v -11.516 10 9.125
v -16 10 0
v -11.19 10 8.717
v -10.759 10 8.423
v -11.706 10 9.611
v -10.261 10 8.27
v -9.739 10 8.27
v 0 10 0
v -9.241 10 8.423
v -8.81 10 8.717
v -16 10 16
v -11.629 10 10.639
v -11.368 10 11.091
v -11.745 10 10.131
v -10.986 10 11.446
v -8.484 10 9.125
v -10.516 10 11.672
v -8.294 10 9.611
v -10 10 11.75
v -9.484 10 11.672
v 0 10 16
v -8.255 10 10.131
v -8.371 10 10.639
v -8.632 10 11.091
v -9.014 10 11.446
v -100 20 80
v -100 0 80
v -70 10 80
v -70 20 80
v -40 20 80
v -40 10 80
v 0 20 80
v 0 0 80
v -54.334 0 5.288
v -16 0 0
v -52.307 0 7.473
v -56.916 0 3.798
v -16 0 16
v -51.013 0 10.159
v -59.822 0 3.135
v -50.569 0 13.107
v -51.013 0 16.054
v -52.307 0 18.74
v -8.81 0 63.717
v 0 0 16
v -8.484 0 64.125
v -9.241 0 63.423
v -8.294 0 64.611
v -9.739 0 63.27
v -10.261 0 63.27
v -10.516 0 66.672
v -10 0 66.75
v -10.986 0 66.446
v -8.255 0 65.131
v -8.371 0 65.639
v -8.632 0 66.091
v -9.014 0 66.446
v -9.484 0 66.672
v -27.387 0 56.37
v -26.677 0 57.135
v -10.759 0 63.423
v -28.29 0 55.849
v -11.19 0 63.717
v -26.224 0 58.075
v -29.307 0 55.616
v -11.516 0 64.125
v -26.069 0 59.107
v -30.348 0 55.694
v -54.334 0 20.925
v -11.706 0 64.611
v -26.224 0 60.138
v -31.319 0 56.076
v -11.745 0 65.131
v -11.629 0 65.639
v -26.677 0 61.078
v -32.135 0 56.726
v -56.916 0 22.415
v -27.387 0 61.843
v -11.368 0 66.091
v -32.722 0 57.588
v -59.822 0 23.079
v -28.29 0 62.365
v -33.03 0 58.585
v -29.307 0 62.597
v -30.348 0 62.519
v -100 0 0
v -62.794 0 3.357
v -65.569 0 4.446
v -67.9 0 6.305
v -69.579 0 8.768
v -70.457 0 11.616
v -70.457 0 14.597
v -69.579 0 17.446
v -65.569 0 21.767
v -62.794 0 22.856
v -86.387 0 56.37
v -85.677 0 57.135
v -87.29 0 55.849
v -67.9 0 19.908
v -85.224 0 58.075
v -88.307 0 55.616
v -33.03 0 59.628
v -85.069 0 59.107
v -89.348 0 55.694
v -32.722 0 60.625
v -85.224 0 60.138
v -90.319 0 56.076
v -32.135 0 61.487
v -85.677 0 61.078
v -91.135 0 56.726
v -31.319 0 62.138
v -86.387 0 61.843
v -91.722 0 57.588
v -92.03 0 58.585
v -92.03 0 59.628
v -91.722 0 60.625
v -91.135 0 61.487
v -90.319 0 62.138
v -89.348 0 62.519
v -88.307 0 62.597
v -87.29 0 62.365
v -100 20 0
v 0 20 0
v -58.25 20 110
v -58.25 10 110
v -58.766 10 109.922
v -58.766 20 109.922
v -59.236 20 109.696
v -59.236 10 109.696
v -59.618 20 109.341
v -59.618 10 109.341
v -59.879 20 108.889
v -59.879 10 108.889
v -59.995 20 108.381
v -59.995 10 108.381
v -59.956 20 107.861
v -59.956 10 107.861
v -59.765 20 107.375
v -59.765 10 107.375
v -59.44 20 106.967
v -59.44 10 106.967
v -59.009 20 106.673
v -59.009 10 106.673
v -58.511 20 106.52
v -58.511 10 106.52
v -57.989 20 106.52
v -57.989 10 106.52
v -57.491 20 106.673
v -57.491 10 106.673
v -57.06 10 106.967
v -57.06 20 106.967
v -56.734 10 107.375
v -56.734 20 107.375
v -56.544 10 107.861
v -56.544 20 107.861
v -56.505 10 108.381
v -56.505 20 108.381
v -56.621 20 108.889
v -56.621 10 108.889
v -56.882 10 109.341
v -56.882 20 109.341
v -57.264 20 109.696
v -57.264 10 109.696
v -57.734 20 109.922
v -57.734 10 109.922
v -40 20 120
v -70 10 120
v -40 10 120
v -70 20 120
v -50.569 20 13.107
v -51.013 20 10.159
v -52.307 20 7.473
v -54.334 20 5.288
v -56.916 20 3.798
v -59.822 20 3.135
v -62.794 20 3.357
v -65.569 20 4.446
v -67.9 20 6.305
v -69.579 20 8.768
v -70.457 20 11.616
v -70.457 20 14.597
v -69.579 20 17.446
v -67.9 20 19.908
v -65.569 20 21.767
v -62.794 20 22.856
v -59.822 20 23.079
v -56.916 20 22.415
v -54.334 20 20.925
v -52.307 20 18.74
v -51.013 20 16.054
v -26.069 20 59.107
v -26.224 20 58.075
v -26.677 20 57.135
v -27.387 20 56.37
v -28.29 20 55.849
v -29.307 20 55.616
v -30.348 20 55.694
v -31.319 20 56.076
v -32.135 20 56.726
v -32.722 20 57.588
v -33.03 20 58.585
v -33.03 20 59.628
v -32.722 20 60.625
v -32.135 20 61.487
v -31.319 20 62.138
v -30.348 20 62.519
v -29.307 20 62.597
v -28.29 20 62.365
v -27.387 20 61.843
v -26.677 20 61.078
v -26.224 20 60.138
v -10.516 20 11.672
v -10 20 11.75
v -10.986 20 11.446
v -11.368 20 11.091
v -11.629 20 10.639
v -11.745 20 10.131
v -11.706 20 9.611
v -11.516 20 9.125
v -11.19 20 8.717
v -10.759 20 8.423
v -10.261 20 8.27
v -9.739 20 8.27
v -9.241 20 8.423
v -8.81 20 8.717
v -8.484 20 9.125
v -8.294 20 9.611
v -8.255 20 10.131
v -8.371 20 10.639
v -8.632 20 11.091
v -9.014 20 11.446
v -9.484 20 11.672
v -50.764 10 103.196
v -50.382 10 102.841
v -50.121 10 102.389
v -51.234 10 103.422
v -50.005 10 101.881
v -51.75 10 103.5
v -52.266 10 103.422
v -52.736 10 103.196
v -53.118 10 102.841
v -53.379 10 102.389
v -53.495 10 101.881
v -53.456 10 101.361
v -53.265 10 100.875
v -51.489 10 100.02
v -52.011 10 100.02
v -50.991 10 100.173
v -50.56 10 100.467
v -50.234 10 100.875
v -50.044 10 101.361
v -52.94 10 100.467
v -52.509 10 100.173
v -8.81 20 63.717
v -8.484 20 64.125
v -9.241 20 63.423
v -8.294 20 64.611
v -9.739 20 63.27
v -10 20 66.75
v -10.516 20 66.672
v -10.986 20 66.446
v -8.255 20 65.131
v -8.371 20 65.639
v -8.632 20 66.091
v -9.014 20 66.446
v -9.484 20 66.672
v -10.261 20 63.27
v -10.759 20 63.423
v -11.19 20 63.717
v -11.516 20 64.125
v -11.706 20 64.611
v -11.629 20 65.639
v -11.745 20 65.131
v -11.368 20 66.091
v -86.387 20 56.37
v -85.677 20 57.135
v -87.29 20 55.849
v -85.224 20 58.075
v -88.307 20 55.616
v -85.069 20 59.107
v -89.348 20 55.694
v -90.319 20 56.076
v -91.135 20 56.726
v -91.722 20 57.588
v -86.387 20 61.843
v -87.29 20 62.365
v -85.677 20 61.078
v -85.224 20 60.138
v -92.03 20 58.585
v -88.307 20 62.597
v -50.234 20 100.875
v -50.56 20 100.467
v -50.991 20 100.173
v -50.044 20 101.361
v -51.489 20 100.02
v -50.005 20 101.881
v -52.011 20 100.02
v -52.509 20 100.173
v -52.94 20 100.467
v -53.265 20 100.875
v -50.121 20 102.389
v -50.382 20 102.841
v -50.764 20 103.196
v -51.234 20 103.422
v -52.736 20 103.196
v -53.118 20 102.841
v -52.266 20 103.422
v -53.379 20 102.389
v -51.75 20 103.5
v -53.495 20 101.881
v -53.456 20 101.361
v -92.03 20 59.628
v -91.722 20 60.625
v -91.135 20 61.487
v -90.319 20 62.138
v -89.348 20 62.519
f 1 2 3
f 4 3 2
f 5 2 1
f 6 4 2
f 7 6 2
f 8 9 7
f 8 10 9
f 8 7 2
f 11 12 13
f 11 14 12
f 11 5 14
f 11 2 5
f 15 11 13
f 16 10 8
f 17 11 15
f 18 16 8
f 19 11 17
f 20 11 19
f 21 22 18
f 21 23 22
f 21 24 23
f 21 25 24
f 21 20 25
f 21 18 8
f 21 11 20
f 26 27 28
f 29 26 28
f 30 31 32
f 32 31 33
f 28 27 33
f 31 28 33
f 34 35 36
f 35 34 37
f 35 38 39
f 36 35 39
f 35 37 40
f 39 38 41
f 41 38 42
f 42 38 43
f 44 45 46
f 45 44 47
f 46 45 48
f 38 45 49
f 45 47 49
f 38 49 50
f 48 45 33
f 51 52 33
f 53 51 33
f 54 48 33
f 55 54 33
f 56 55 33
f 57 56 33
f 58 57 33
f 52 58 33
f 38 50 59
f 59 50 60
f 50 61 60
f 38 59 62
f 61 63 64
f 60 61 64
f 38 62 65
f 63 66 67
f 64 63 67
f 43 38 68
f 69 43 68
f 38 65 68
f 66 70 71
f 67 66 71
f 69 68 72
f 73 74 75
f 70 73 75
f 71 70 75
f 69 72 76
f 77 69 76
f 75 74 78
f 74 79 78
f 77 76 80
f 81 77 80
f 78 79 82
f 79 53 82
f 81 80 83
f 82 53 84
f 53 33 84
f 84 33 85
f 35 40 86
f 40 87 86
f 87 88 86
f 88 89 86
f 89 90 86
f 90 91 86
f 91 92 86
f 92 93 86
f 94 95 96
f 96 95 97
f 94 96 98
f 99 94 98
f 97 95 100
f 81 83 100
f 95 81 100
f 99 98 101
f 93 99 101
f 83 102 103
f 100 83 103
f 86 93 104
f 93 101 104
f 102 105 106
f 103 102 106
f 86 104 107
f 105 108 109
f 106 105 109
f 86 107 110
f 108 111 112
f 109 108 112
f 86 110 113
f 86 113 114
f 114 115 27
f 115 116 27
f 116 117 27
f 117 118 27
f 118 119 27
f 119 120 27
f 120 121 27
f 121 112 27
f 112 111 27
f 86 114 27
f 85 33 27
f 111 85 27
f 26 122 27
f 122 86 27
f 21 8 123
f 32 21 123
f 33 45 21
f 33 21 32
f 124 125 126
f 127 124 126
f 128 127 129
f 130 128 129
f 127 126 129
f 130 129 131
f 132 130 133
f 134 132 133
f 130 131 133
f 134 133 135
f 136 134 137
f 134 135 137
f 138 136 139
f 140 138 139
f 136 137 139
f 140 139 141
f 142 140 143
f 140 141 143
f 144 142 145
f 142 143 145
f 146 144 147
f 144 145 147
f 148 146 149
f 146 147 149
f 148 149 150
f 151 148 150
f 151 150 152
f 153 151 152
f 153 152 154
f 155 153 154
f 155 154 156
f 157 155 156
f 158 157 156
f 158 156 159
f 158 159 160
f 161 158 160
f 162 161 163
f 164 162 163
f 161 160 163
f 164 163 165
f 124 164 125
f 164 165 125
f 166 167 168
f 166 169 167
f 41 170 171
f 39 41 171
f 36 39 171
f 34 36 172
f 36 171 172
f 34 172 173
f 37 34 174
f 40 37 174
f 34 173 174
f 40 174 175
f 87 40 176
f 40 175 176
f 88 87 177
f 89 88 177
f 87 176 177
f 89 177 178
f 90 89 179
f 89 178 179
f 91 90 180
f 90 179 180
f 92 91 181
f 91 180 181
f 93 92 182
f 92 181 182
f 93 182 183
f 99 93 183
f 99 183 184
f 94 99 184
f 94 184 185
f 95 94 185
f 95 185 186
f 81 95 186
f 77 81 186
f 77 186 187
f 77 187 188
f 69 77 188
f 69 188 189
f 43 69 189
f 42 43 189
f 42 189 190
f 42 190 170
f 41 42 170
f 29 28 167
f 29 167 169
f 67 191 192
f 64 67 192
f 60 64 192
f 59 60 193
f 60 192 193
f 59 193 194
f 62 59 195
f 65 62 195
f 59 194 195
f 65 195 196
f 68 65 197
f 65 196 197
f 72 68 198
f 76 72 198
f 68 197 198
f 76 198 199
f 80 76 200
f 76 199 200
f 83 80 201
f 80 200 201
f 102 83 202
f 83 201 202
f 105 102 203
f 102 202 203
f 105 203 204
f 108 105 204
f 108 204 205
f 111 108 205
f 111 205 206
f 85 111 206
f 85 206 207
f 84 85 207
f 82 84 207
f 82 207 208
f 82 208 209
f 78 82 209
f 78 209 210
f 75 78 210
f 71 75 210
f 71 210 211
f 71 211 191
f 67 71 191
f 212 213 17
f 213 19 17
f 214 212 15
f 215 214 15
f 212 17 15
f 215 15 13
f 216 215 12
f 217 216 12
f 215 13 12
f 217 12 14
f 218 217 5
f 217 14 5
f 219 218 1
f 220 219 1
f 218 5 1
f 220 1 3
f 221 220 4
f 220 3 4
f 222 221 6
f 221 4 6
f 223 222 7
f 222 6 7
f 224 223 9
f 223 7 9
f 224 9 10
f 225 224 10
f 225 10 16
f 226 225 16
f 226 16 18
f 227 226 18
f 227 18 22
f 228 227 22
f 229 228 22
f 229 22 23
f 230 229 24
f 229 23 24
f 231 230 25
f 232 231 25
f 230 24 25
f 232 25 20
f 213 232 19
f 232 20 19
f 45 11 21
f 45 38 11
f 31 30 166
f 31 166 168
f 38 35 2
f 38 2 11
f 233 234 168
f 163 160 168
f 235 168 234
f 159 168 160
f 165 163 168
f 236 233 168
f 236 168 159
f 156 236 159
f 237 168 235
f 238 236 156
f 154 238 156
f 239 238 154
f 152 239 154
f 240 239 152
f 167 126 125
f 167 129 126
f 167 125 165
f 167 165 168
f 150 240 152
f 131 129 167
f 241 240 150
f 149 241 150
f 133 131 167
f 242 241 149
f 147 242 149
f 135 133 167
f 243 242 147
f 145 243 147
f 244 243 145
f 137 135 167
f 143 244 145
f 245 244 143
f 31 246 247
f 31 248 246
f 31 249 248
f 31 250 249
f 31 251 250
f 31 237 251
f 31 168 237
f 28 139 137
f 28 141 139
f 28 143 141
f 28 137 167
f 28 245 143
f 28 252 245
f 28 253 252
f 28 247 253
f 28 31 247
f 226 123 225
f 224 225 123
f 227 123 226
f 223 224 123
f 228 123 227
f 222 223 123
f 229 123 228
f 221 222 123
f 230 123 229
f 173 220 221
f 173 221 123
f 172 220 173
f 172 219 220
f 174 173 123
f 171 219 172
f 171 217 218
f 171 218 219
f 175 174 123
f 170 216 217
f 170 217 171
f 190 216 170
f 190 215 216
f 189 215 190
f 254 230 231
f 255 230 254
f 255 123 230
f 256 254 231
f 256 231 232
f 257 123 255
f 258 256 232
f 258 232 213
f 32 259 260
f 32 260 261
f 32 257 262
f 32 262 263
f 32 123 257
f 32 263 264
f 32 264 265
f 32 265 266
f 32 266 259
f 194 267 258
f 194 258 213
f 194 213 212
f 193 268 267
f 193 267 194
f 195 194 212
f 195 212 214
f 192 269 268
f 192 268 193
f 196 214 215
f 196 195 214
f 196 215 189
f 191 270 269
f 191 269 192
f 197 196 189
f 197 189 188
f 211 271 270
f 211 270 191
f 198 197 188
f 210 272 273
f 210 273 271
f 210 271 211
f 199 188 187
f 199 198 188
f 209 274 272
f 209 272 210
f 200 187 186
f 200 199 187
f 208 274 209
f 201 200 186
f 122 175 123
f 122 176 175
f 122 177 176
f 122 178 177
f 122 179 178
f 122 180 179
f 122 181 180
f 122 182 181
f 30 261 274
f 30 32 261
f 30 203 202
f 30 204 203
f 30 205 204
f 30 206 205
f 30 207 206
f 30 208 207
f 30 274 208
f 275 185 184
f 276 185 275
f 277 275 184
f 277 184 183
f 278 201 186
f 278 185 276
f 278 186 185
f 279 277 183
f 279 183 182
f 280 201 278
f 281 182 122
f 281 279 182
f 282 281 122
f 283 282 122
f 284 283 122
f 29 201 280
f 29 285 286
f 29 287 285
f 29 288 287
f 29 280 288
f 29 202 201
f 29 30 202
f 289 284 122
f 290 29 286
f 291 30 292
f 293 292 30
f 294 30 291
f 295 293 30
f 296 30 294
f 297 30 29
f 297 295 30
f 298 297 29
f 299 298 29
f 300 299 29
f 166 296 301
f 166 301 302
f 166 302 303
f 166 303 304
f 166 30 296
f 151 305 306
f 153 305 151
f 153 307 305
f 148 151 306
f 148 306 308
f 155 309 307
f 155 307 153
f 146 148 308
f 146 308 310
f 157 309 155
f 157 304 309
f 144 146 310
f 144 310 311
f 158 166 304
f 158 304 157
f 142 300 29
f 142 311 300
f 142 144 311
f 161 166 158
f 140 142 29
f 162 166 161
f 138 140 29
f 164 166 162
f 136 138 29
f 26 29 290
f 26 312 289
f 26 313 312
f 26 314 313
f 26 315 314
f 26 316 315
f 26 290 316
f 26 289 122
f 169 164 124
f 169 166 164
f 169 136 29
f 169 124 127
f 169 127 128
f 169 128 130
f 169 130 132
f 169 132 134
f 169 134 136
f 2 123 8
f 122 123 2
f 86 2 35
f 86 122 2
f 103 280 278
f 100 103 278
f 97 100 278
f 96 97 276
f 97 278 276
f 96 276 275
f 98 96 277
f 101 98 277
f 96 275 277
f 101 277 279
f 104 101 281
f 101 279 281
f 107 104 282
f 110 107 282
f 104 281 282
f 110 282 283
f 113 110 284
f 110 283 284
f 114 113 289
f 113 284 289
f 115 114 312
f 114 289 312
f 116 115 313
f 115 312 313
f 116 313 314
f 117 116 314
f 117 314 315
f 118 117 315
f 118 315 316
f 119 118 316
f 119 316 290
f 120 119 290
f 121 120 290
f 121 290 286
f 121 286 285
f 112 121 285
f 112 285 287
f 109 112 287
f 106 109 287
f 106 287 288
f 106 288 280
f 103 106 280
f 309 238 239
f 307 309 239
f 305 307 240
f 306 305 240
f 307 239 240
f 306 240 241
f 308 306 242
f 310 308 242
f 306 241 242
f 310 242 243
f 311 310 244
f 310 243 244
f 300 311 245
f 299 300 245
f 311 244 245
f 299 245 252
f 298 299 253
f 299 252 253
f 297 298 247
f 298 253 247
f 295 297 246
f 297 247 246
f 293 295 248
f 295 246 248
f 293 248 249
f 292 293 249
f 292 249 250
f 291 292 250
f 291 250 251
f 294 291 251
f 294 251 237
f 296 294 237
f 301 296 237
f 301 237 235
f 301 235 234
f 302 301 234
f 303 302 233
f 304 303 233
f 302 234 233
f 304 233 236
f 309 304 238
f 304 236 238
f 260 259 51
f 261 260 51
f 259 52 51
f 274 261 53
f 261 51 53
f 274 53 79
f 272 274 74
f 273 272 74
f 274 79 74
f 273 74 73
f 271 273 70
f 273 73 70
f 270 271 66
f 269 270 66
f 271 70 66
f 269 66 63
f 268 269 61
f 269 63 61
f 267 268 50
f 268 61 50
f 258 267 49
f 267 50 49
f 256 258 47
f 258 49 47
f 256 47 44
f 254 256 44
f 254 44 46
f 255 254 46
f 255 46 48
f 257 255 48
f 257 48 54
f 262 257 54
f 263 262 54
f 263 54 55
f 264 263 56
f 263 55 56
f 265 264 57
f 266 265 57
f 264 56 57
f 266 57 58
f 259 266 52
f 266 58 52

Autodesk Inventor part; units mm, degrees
ref_plane "YZ Plane" through (0, 0, 0) normal (1, 0, 0) x (0, 1, 0)
ref_plane "XZ Plane" through (0, 0, 0) normal (0, 1, 0) x (-1, 0, 0)
ref_plane "XY Plane" through (0, 0, 0) normal (0, 0, 1) x (1, 0, 0)
sketch "Boceto1" plane through (0, 0, 0) normal (0, 1, 0) x (-1, 0, 0)
  line L0 (100, 80) -> (-100, 80)
  line L1 (-100, 80) -> (-100, -80)
  line L2 (-100, -80) -> (100, -80)
  line L3 (100, -80) -> (100, 80)
  line L4 (100, 80) -> (-100, -80) construction
  line L5 (-100, 80) -> (100, -80) construction
  point P0 (0, 0)
  dimension "d0" = 200
  dimension "d1" = 160
extrude "Extrusión1" add sketch "Boceto1" along normal blind 20
sketch "Boceto2" plane through (0, 20, 0) normal (0, 1, 0) x (1, 0, 0)
  line L0 (-100, 80) -> (-100, -80) projected
  line L1 (-100, 80) -> (-70, 80)
  line L2 (-70, 80) -> (-70, 40)
  line L3 (-70, 40) -> (-100, 40)
  line L4 (-100, 40) -> (-100, 80)
  line L5 (100, 80) -> (-100, 80) projected
  line L6 (0, 80) -> (0, 40)
  line L7 (100, 80) -> (70, 80)
  line L8 (70, 80) -> (70, 40)
  line L9 (70, 40) -> (100, 40)
  line L10 (100, 40) -> (100, 80)
  point P0 (0, 0)
  dimension "d4" = 30
  dimension "d5" = 40
extrude "Extrusión2" cut sketch "Boceto2" against normal blind 10
sketch "Boceto3" plane through (0, 20, 0) normal (0, 1, 0) x (1, 0, 0)
  line L0 (-70, 80) -> (-70, 40) projected
  line L1 (-70, 80.0001) -> (-70, 40)
  line L2 (-70, 40) -> (-100, 40) projected
  line L3 (-100, 40) -> (-100, 80.0001)
  line L4 (-100, 40) -> (-70, 40)
  line L5 (-70, 40) -> (-70, 80)
  line L6 (-70, 80) -> (-100, 80)
  line L7 (-100, 80) -> (-100, 40)
  circle A0 centre (-88.25, 58.25) radius 1.75
  circle A1 centre (-81.75, 51.75) radius 1.75
  line L8 (100, 80) -> (-100, 80) projected
  line L9 (0, 80) -> (0, 56.5)
  circle A2 centre (88.25, 58.25) radius 1.75
  circle A3 centre (81.75, 51.75) radius 1.75
  point P0 (0, 0)
  point P1 (-64.3507, 80)
  point P2 (-74.3507, 0)
  point P3 (-85, 80)
  dimension "d23" = 21.75
  dimension "d24" = 11.75
  dimension "d26" = 11.75
hole "Agujero1" at (-81.75, 20, -51.75) at (-88.25, 20, -58.25) at (81.75, 20, -51.75) at (88.25, 20, -58.25) direction (0, -1, 0) diameter 3.5 end through all
sketch "Boceto4" plane through (-100, 0, 80) normal (0, 0, 1) x (1, 0, 0)
  line L0 (30, 20) -> (60, 20)
  line L1 (60, 20) -> (60, 10)
  line L2 (60, 10) -> (30, 10)
  line L3 (30, 10) -> (30, 20)
  line L4 (0, 0) -> (0, 20) projected
  line L5 (100, 0) -> (100, 10)
  line L6 (170, 20) -> (140, 20)
  line L7 (140, 20) -> (140, 10)
  line L8 (140, 10) -> (170, 10)
  line L9 (170, 10) -> (170, 20)
  dimension "d34" = 30
  dimension "d35" = 10
  dimension "d36" = 30
extrude "Extrusión3" add sketch "Boceto4" along normal blind 40
sketch "Boceto5" plane through (0, 20, 0) normal (0, 1, 0) x (1, 0, 0)
  line L0 (59.9999, -50) -> (69.9999, -50)
  line L1 (49.9999, -101.75) -> (49.9999, -79.9497)
  line L2 (59.9999, -108.25) -> (59.9999, -50)
  line L3 (40, -80) -> (69.9999, -80)
  line L4 (49.9999, -79.9497) -> (40, -80)
  circle A0 centre (51.7499, -101.75) radius 1.75
  circle A1 centre (58.2499, -108.25) radius 1.75
  line L5 (69.9999, -80) -> (69.9999, -120)
  line L6 (40, -120) -> (40, -80)
  line L7 (69.9999, -120) -> (40, -120)
  line L8 (0, -50) -> (0, -71.75)
  line L9 (-40, -120) -> (-40, -80)
  line L10 (-49.9999, -101.75) -> (-49.9999, -79.9497)
  circle A2 centre (-51.7499, -101.75) radius 1.75
  circle A3 centre (-58.2499, -108.25) radius 1.75
  line L11 (-40, -80) -> (-69.9999, -80)
  line L12 (-69.9999, -120) -> (-40, -120)
  line L13 (-69.9999, -80) -> (-69.9999, -120)
  line L14 (-59.9999, -108.25) -> (-59.9999, -50)
  line L15 (-40, -120) -> (-69.9999, -120)
  line L16 (-69.9999, -80) -> (-69.9999, -120)
  line L17 (-40, -120) -> (-70, -120) projected
  line L18 (-40, -80) -> (-40, -120) projected
  line L19 (-59.9999, -110) -> (-49.9999, -110)
  line L20 (-49.9999, -110) -> (-49.9999, -100)
  line L21 (-49.9999, -100) -> (-59.9999, -100)
  line L22 (-59.9999, -100) -> (-59.9999, -110)
  line L23 (-100, 40) -> (-100, -80) projected
  point P0 (0, 0)
  point P1 (-56.75, -68.25)
  point P2 (-63.25, -61.75)
  point P3 (63.25, -61.75)
  point P4 (56.75, -68.25)
  dimension "d45" = 3.5
  dimension "d46" = 3.5
  dimension "d39" = 10
  dimension "d40" = 10
  dimension "d41" = 40
  dimension "d42" = 0
  dimension "d43" = 6.5
  dimension "d44" = 6.5
  dimension "d47" = 11.7499
  dimension "d48" = 11.75
  dimension "d49" = 0
  dimension "d50" = 11.75
  dimension "d51" = 0
  dimension "d97" = 40.0001
hole "Agujero2" at (-58.2499, 20, 108.25) at (-51.7499, 20, 101.75) at (51.7499, 20, 101.75) at (58.2499, 20, 108.25) direction (0, -1, 0) diameter 3.5 end through all
sketch "Boceto6" plane through (0, 20, 0) normal (0, 1, 0) x (1, 0, 0)
  circle A0 centre (-60.569, -13.1067) radius 10
  circle A1 centre (-29.569, -59.1067) radius 3.5
  line L0 (-60.569, -13.1067) -> (-39.0083, -13.1067)
  circle A2 centre (-29.569, 25.8933) radius 3.5
  circle A3 centre (-88.569, 25.8933) radius 3.5
  circle A4 centre (-88.569, -59.1067) radius 3.5
  line L1 (70.4544, -63.0517) -> (18.4544, -63.0517)
  line L2 (18.4544, -63.0517) -> (18.4544, 6.9483)
  line L3 (18.4544, 6.9483) -> (70.4544, 6.9483)
  line L4 (70.4544, 6.9483) -> (70.4544, -63.0517)
  line L5 (70.4544, 6.9483) -> (48.4544, 6.9483)
  line L6 (48.4544, 6.9483) -> (48.4544, 48.9483)
  line L7 (48.4544, 48.9483) -> (70.4544, 48.9483)
  line L8 (70.4544, 48.9483) -> (70.4544, 6.9483)
  line L9 (77.2288, -8.158) -> (77.2281, -5.6604)
  circle A5 centre (63.7706, -5.7606) radius 1.75
  line L10 (70.7641, -24.1464) -> (70.7641, 22.2796)
  circle A6 centre (35.8307, -5.7609) radius 1.75
  line L11 (25.1581, -13.2381) -> (25.1581, -10.7404)
  circle A7 centre (68.8507, -57.8309) radius 1.75
  line L12 (26.4277, 35.0051) -> (26.4277, 37.5029)
  circle A8 centre (20.6074, -56.5614) radius 1.75
  line L13 (18.6941, -55.9176) -> (70.7641, -55.9176)
  line L14 (18.6941, -55.9176) -> (18.6941, -7.6743)
  line L15 (44.7291, -55.9176) -> (44.7291, -31.7959)
  line L16 (63.7706, -28.0517) -> (26.4277, -28.0517)
  line L17 (44.7291, -23.5247) -> (44.7291, -31.7959)
  point P0 (0, 0)
  point P1 (-60.569, -16.6067)
  point P2 (45.425, 12.8886)
  point P3 (44.7291, -28.0517)
  dimension "d59" = 7
  dimension "d60" = 7
  dimension "d61" = 7
  dimension "d62" = 39
  dimension "d63" = 46
  dimension "d64" = 59
  dimension "d65" = 46
  dimension "d66" = 39
  dimension "d67" = 59
  dimension "d68" = 52
  dimension "d69" = 70
  dimension "d70" = 22
  dimension "d71" = 42
  dimension "d72" = 3.5
  dimension "d73" = 3.5
  dimension "d74" = 3.5
  dimension "d75" = 3.5
  dimension "d142" = 17.3763
  dimension "d143" = 12.7092
  dimension "d144" = 6.6837
  dimension "d145" = 12.7089
  dimension "d146" = 5.2208
  dimension "d147" = 1.6037
  dimension "d148" = 2.1531
  dimension "d149" = 6.4903
hole "Agujero3" at (68.8507, 20, 57.8309) at (20.6074, 20, 56.5614) at (63.7706, 20, 5.7606) at (35.8307, 20, 5.7609) direction (0, -1, 0) diameter 3.5 end through all
sketch "Boceto7" plane through (0, 20, 0) normal (0, 1, 0) x (1, 0, 0)
  circle A0 centre (-60.569, -13.1067) radius 10
  circle A1 centre (-29.569, -59.1067) radius 3.5
  line L0 (-60.569, -13.1067) -> (-39.0083, -13.1067)
  circle A2 centre (-29.569, 25.8933) radius 3.5
  circle A3 centre (-88.569, 25.8933) radius 3.5
  circle A4 centre (-88.569, -59.1067) radius 3.5
  point P0 (0, 0)
  point P1 (-60.569, -16.6067)
  dimension "d83" = 7
  dimension "d84" = 7
  dimension "d85" = 7
  dimension "d86" = 39
  dimension "d87" = 46
  dimension "d88" = 59
  dimension "d89" = 46
  dimension "d90" = 39
  dimension "d91" = 59
extrude "Extrusión4" cut sketch "Boceto7" against normal blind 20
ref_plane "Plano de trabajo1" through (0, 0, -80) normal (-1, 0, 0) x (0, 0, 1)
ref_plane "Plano de trabajo2" through (100, 0, 0) normal (0, 0, -1) x (-1, 0, 0)
sketch "Boceto8" plane through (0, 20, 0) normal (0, 1, 0) x (1, 0, 0)
  line L0 (80, -15) -> (90, -15)
  circle A0 centre (85, -10) radius 1.75
  line L1 (85, 10) -> (85, -10)
  line L2 (90, -15) -> (90, 15)
  circle A1 centre (85, 10) radius 1.75
  line L3 (80, 15) -> (80, -15)
  line L4 (90, 15) -> (80, -15) construction
  line L5 (80, 15) -> (90, -15) construction
  line L6 (90, 15) -> (80, 15)
  line L7 (100, -80) -> (100, 40) projected
  line L8 (0, 0) -> (20, -20)
  line L9 (0, 0) -> (28.2843, 0) construction
  line L10 (15, -60) -> (15, -70)
  circle A2 centre (10, -65) radius 1.75
  line L11 (-10, -65) -> (10, -65)
  line L12 (15, -70) -> (-15, -70)
  circle A3 centre (-10, -65) radius 1.75
  line L13 (-15, -60) -> (15, -60)
  line L14 (-15, -70) -> (15, -60) construction
  line L15 (-15, -60) -> (15, -70) construction
  line L16 (-15, -70) -> (-15, -60)
  line L17 (0, 0) -> (18.6615, 18.6615)
  line L18 (0, 0) -> (26.3913, 0) construction
  line L19 (-15, 60) -> (-15, 70)
  circle A4 centre (-10, 65) radius 1.75
  line L20 (10, 65) -> (-10, 65)
  line L21 (-15, 70) -> (15, 70)
  circle A5 centre (10, 65) radius 1.75
  line L22 (15, 60) -> (-15, 60)
  line L23 (15, 70) -> (-15, 60) construction
  line L24 (15, 60) -> (-15, 70) construction
  line L25 (15, 70) -> (15, 60)
  line L26 (70, 80) -> (-70, 80) projected
  line L27 (-40, -80) -> (40, -80) projected
  point P0 (86.9608, 0)
  point P1 (86.9608, 0)
  point P2 (85, 15)
  point P3 (0, -69.1269)
  point P4 (0, -69.1269)
  point P5 (-15, -67.1661)
  point P6 (0, 69.7066)
  point P7 (0, 69.7066)
  point P8 (15, 67.7458)
  point P9 (-15, 65)
  point P10 (15, -65)
  dimension "d98" = 10
  dimension "d99" = 30
  dimension "d100" = 10
  dimension "d101" = 5
  dimension "d102" = 5
  dimension "d103" = 5
  dimension "d104" = 5
  dimension "d105" = 45
  dimension "d106" = 45
  dimension "d107" = 10
  dimension "d108" = 10
  dimension "d109" = 30
  dimension "d110" = 5
  dimension "d111" = 5
  dimension "d112" = 5
  dimension "d113" = 5
  dimension "d114" = 10
  dimension "d115" = 30
  dimension "d116" = 5
  dimension "d117" = 5
  dimension "d118" = 5
  dimension "d119" = 5
  dimension "d120" = 10
hole "Agujero4" at (-10, 20, -65) at (10, 20, -65) at (85, 20, -10) at (85, 20, 10) at (10, 20, 65) at (-10, 20, 65) direction (0, -1, 0) diameter 3.5 end through all
sketch "Boceto9" plane through (0, 20, 0) normal (0, 1, 0) x (1, 0, 0)
  circle A0 centre (10, -10) radius 1.75
  line L0 (6.803, 0) -> (14.6069, 0)
  line L1 (0, 0) -> (0, -4.8284)
  line L2 (0, 0) -> (20.0354, 0)
  circle A1 centre (10, 10) radius 1.75
  line L3 (0, 0) -> (0, 4.8284)
  circle A2 centre (-10, 10) radius 1.75
  circle A3 centre (-10, -10) radius 1.75
  dimension "d128" = 3.5
  dimension "d129" = 10
  dimension "d130" = 10
hole "Agujero5" at (-10, 20, 10) at (-10, 20, -10) at (10, 20, -10) at (10, 20, 10) direction (0, -1, 0) diameter 3.5 end through all
sketch "Boceto10" plane through (0, 0, 0) normal (0, -1, 0) x (1, 0, 0)
  line L0 (-16, 16) -> (16, 16)
  line L1 (16, 16) -> (16, -16)
  line L2 (16, -16) -> (-16, -16)
  line L3 (-16, -16) -> (-16, 16)
  line L4 (-16, 16) -> (16, -16) construction
  line L5 (16, 16) -> (-16, -16) construction
  point P0 (0, 0)
  point P1 (0, 0)
  dimension "d138" = 32
  dimension "d139" = 32
extrude "Extrusión5" cut sketch "Boceto10" against normal blind 10
split "Dividir1" plane through (100, 0, 0) removes the side toward (0, 0, -1)
split "Dividir2" plane through (0, 0, -80) removes the side toward (1, 0, 0)
properties part number "base_mid_3"
